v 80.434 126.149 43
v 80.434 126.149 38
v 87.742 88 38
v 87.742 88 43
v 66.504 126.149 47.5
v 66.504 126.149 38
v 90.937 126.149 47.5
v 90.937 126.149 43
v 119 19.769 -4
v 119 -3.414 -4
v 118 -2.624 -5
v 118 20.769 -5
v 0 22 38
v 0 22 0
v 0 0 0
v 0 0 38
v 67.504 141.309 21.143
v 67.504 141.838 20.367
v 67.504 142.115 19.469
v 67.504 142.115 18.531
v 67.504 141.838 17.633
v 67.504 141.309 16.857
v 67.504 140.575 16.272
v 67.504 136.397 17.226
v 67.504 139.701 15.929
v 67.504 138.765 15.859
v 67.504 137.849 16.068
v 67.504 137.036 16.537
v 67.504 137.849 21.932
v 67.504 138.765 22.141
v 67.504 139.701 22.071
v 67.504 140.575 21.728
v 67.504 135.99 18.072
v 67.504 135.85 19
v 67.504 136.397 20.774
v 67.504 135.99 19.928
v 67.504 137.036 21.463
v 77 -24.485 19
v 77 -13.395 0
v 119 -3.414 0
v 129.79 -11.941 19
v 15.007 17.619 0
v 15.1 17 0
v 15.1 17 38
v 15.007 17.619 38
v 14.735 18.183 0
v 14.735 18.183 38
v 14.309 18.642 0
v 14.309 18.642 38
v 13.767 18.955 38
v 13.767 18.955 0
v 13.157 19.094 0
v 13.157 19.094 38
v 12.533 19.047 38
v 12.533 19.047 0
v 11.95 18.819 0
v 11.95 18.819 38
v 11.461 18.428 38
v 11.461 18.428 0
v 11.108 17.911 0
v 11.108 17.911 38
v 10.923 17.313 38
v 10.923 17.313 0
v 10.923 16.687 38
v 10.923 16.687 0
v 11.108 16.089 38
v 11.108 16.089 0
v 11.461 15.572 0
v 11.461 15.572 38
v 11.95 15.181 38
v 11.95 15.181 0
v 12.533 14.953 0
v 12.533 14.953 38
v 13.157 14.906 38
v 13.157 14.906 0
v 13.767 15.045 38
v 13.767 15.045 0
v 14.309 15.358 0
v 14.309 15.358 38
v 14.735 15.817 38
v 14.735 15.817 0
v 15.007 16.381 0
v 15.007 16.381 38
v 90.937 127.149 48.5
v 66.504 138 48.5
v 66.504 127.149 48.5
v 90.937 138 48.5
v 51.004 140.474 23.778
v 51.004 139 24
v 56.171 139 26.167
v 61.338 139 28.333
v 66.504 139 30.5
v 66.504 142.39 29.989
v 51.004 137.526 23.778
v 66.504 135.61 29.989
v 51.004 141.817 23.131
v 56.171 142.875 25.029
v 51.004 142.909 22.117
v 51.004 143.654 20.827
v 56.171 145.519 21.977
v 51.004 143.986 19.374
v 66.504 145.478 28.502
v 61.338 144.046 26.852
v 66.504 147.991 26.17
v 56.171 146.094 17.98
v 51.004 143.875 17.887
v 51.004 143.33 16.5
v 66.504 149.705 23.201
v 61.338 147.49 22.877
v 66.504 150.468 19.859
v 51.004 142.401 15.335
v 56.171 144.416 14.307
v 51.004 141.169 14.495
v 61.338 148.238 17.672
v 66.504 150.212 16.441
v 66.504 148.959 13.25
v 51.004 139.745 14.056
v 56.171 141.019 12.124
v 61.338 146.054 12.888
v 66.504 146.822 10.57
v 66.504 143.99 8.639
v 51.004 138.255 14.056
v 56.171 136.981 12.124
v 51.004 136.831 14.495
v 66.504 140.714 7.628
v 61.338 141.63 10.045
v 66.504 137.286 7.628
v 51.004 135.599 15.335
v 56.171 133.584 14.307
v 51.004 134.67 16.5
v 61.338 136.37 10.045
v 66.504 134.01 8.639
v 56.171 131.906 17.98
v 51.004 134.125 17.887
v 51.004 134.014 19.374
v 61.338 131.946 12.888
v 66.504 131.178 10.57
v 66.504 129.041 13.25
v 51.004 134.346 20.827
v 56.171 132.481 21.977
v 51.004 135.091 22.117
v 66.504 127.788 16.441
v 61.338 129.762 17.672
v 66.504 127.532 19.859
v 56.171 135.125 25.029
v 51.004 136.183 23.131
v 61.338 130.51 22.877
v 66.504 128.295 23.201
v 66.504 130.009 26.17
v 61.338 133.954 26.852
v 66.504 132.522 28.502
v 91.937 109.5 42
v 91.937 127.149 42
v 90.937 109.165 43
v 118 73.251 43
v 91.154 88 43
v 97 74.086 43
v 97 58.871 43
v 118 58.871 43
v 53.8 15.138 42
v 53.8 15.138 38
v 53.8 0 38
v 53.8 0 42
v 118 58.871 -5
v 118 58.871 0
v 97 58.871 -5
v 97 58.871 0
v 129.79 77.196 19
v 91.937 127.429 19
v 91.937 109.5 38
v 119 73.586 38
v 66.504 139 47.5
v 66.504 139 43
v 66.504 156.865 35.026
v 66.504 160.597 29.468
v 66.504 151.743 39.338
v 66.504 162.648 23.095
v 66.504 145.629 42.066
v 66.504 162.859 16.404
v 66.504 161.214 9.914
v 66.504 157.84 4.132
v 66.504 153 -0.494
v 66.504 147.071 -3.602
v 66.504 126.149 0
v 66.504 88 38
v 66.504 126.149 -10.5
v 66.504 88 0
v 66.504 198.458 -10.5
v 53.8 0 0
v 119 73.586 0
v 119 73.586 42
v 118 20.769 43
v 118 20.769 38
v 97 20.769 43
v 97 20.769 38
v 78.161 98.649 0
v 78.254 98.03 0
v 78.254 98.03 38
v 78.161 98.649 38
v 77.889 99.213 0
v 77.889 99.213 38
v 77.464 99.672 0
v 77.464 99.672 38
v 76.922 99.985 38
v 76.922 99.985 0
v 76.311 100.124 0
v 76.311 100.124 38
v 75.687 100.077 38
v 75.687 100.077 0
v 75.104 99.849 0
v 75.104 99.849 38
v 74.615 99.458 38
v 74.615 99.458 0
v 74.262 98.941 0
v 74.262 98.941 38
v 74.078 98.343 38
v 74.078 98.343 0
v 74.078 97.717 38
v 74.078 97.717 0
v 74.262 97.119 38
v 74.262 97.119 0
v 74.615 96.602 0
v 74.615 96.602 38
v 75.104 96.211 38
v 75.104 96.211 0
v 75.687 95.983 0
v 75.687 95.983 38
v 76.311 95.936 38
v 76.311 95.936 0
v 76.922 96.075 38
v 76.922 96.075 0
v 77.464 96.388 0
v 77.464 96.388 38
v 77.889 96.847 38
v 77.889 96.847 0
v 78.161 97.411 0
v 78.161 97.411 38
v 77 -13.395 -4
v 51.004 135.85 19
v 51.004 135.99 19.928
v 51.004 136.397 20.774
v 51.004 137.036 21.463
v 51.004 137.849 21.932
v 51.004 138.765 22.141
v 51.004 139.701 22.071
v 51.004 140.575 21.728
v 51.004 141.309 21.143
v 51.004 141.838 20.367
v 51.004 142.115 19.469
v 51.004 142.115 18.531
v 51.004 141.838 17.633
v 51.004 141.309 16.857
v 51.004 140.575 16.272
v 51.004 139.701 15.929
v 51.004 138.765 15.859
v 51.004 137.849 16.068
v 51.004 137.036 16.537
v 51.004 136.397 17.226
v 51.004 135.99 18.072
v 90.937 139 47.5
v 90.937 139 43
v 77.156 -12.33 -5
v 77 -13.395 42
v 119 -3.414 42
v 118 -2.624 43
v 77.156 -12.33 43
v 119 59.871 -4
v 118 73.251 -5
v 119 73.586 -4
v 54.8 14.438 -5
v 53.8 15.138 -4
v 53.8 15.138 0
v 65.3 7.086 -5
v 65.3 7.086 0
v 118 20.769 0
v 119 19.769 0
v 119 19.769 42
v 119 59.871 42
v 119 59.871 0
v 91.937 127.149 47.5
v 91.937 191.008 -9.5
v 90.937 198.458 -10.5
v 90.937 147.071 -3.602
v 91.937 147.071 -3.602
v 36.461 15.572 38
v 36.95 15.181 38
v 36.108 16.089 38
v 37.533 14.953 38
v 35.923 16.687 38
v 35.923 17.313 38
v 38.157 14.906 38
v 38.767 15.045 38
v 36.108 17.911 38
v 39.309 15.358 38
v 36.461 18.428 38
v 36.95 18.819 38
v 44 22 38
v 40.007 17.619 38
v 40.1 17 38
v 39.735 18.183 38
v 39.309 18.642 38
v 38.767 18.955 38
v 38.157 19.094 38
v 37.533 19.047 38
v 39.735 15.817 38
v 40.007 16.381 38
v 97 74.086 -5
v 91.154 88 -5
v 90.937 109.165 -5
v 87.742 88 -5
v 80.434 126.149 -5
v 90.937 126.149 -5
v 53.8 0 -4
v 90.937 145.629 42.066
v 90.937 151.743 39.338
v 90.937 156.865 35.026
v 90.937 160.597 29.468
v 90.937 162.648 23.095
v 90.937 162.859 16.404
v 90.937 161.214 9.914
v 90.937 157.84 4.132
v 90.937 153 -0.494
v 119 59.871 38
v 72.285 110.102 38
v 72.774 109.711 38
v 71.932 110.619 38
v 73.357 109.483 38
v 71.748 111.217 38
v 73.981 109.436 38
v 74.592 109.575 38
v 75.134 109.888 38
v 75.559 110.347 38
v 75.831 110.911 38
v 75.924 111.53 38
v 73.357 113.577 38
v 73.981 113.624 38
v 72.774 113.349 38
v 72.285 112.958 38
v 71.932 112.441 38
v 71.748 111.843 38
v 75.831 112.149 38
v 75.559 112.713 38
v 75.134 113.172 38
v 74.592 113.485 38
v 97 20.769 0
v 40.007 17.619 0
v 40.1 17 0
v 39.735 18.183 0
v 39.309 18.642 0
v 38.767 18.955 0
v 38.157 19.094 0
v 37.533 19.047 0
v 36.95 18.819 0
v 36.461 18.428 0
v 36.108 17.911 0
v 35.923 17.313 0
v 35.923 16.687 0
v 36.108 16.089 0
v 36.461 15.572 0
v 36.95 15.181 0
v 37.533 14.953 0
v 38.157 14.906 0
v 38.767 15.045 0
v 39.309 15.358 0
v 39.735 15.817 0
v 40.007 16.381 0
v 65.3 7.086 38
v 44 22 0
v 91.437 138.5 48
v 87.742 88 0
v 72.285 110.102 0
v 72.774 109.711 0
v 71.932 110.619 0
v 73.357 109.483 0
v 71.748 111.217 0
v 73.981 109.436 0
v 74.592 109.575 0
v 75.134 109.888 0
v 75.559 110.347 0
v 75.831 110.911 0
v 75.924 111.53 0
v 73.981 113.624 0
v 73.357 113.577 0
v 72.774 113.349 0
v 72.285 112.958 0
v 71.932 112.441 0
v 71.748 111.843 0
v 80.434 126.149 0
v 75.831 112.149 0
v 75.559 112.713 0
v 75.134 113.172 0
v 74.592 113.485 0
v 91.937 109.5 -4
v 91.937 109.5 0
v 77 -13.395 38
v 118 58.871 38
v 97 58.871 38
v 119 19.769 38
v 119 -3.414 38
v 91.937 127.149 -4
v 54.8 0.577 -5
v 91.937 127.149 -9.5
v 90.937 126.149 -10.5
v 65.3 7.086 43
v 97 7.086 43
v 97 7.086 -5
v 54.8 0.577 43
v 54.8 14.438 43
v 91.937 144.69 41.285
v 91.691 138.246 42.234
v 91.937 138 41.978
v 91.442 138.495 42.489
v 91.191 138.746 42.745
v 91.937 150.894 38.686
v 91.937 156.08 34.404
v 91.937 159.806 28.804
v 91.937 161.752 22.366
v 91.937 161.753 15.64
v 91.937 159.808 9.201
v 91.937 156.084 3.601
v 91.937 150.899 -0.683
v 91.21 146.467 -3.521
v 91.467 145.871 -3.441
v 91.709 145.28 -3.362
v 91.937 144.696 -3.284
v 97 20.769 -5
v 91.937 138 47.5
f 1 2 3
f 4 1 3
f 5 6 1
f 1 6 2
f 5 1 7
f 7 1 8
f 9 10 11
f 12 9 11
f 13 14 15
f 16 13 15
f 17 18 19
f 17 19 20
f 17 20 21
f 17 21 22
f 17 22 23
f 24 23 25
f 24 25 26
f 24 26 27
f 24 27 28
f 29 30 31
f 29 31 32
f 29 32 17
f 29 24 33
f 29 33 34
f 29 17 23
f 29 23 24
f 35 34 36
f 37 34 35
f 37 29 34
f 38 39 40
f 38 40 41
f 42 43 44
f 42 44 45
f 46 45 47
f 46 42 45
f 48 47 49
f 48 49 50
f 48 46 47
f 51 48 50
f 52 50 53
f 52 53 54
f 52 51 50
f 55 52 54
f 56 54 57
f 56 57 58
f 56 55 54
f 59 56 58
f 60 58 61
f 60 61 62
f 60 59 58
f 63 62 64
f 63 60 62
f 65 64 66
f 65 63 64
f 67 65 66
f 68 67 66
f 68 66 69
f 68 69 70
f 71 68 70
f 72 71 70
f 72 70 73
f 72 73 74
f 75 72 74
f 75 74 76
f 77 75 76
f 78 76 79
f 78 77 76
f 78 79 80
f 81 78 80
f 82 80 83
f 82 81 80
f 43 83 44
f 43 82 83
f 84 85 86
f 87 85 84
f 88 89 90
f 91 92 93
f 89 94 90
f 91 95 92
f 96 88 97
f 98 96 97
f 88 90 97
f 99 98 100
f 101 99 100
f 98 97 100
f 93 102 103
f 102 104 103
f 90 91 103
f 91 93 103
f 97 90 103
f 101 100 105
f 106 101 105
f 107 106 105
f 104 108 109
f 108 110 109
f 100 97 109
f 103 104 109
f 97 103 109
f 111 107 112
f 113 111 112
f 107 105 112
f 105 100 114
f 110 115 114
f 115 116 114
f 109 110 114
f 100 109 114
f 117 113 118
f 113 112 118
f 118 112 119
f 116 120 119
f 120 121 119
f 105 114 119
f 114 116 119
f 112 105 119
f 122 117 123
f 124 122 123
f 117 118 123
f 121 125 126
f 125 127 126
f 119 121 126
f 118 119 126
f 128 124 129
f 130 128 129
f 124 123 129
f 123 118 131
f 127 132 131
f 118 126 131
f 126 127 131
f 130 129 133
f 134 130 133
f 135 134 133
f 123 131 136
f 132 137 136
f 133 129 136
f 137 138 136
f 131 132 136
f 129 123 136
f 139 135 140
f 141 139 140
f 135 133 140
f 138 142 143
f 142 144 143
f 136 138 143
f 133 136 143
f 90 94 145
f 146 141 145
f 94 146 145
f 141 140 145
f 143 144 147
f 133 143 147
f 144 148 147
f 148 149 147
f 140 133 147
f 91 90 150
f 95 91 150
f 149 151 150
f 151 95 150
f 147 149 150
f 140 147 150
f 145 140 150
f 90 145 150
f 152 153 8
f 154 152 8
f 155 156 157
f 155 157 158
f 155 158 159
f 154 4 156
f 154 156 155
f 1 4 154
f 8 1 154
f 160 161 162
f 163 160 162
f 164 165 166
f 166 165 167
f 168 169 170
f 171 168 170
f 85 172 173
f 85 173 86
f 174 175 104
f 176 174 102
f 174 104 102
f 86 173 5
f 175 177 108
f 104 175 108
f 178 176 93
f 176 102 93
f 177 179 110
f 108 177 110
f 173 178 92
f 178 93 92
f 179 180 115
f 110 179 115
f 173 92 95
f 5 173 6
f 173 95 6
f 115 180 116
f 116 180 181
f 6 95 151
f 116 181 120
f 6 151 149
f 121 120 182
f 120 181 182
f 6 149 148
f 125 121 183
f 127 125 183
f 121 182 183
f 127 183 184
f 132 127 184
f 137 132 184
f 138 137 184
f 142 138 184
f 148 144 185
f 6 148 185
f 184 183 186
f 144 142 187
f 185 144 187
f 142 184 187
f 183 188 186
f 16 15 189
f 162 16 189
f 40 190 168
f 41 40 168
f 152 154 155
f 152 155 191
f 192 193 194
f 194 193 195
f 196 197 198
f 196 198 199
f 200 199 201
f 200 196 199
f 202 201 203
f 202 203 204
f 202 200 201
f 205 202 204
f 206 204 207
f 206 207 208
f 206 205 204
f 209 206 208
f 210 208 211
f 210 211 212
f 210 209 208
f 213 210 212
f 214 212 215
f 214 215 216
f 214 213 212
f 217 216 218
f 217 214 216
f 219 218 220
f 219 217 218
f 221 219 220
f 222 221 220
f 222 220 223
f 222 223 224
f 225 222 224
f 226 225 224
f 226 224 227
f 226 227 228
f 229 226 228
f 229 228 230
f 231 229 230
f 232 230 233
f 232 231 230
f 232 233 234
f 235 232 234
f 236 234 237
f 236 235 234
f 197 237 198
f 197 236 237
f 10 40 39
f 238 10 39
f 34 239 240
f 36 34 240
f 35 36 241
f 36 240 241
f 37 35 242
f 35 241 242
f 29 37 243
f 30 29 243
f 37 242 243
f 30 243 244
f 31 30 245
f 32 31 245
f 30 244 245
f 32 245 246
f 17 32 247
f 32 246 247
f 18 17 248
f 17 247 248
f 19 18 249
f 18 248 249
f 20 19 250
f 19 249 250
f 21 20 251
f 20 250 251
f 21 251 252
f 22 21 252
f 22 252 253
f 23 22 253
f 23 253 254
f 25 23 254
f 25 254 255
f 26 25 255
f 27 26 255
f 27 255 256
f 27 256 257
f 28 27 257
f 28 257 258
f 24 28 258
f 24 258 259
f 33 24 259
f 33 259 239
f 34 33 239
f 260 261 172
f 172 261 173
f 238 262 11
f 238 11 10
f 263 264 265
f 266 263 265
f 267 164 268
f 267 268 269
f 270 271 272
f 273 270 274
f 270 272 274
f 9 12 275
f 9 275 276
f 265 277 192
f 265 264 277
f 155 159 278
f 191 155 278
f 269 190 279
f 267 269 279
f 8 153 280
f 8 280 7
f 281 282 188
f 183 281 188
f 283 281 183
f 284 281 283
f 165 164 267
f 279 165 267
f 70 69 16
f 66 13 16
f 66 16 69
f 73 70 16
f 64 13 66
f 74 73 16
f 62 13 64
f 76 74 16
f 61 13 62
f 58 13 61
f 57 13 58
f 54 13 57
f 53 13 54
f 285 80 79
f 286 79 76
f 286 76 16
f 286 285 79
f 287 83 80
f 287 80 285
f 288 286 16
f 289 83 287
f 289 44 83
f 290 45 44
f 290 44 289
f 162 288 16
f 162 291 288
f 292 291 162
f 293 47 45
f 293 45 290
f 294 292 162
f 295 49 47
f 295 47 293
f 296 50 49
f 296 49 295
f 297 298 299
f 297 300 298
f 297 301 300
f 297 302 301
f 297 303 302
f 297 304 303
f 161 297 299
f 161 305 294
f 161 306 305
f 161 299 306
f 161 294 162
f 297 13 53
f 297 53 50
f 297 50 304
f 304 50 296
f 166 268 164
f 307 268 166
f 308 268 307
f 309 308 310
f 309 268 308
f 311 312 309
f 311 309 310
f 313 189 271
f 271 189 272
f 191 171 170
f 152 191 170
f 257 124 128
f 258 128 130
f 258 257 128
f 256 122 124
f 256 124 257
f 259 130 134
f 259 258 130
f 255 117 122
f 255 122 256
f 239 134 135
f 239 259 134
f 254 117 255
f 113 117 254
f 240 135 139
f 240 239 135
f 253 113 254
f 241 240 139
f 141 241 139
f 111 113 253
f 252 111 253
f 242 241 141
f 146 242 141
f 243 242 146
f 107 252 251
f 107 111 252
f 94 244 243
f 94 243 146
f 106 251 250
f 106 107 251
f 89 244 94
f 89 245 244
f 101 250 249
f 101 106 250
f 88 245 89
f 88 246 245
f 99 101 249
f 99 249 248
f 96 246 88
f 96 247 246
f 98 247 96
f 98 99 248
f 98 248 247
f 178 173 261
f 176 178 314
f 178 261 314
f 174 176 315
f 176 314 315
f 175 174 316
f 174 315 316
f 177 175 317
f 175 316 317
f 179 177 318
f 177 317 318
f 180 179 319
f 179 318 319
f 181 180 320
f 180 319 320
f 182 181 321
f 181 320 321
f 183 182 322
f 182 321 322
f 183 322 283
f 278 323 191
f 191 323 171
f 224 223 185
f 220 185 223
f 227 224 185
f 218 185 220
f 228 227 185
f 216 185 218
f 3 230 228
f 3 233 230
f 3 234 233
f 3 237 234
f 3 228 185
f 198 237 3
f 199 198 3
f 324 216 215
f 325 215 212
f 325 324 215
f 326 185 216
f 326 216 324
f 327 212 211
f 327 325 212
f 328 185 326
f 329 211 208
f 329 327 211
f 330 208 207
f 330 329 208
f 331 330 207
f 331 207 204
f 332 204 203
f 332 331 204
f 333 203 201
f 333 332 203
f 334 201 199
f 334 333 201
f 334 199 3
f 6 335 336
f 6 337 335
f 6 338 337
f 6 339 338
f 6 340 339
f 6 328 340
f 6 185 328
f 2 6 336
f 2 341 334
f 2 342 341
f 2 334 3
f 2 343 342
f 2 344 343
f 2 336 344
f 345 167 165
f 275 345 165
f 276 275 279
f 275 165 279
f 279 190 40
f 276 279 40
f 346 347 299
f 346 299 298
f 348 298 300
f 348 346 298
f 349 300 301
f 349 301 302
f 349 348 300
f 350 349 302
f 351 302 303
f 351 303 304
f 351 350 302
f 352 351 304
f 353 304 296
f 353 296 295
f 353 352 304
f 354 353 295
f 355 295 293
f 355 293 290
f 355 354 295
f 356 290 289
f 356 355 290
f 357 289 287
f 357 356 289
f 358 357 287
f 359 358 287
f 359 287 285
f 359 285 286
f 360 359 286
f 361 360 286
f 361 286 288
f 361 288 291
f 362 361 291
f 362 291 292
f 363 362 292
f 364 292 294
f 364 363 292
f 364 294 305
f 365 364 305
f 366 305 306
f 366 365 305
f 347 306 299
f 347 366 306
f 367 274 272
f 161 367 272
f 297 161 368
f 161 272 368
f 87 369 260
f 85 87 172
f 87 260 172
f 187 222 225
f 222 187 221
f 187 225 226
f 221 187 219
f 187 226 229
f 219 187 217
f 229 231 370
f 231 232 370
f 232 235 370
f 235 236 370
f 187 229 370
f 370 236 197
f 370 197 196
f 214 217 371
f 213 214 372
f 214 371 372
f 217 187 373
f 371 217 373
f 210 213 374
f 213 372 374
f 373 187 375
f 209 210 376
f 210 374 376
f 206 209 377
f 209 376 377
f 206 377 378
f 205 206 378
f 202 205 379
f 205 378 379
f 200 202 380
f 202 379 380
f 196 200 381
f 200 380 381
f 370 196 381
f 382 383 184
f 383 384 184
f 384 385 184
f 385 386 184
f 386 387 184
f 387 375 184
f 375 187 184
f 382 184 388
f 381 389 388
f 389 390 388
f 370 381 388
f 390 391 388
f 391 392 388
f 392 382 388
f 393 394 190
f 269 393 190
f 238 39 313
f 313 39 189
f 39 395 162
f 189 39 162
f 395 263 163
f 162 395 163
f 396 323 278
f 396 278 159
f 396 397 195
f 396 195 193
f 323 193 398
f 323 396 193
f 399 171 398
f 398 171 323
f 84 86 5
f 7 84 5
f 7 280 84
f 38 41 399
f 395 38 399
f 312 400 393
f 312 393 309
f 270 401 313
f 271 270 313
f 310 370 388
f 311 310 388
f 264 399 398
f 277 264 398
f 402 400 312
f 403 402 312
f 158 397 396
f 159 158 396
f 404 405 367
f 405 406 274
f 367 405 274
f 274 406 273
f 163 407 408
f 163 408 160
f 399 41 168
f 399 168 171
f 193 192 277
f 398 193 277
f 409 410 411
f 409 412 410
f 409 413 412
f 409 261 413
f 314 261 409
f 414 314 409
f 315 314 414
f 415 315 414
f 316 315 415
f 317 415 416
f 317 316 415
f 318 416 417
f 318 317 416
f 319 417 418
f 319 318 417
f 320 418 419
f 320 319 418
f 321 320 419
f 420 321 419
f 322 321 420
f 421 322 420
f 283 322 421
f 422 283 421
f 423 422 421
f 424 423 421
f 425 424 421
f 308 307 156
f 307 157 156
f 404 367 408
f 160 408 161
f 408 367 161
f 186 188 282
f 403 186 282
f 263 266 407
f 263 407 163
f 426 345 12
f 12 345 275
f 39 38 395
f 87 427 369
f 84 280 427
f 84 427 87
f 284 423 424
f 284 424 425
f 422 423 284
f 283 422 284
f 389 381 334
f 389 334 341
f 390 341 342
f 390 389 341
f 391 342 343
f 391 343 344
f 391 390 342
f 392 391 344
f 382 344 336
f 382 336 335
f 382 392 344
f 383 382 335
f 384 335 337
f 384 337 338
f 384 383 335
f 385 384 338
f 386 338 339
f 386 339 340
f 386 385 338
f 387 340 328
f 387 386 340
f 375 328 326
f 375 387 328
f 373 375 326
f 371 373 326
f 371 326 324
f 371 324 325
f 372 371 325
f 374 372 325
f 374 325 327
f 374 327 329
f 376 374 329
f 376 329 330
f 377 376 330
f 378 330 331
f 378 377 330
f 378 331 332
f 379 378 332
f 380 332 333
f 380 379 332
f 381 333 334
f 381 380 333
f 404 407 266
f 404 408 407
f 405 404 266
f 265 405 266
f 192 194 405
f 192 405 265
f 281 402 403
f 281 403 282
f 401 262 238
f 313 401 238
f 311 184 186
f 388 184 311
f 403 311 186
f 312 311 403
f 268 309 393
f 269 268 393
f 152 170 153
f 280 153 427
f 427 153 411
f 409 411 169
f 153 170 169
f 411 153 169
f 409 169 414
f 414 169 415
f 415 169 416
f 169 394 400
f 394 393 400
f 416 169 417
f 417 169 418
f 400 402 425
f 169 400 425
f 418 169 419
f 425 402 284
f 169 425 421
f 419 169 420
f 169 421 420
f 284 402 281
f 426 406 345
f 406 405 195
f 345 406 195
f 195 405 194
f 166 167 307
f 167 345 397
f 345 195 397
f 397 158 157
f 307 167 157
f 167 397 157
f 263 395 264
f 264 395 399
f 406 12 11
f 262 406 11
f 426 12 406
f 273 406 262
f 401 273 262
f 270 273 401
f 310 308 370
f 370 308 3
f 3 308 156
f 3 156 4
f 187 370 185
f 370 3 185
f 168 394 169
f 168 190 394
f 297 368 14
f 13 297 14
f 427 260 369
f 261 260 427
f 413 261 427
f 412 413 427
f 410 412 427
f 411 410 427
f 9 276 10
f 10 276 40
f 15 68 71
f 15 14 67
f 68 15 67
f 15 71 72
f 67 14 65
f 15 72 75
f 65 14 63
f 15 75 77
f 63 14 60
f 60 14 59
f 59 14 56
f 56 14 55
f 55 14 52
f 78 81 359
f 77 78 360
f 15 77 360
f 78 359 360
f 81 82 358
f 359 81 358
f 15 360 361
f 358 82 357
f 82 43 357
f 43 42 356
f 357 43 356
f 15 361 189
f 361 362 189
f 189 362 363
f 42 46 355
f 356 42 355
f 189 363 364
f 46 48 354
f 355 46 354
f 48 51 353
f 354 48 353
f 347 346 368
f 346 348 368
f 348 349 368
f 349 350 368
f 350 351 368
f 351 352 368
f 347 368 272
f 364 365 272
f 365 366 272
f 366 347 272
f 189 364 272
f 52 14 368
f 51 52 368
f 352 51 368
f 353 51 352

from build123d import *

# Parameters (mm, degrees)
SKETCH_1_R          = 2.1
EXTRUDE_1_DEPTH     = 38
CUT_EXTRUDE_1_DEPTH = 187.709206858
SKETCH_3_R          = 3.15
CUT_EXTRUDE_3_DEPTH = 1
EXTRUDE_2_DEPTH     = 5
EXTRUDE_3_DEPTH     = 5
EXTRUDE_2_2_DEPTH   = 25.432180104
EXTRUDE_7_DEPTH     = 25.432180104
SKETCH_18_W         = 25.432180104
SKETCH_18_H         = 5.5
EXTRUDE_8_DEPTH     = 2.30961622
EXTRUDE_10_DEPTH    = 5.5
SKETCH_21_R         = 5
SKETCH_20_R         = 11.5
SKETCH_23_R         = 3.15
CUT_EXTRUDE_4_DEPTH = 15.5
CHAMFER_1_SIZE      = 1


with BuildPart() as part:
    # 草图1 → 凸台-拉伸1 (new body)
    with BuildSketch(Plane.XY):
        Polygon((0, 0), (53.8, 0), (77, -13.394526245), (119, -3.414420564), (119, 73.585579436), (91.936542927, 109.5), (91.936542927, 158), (66.504362823, 158), (66.504362823, 88), (91.154362823, 88), (97, 74.085579436), (97, 7.085579436), (65.3, 7.085579436), (44, 22), (0, 22), align=None)
        with Locations((73.824362823, 111.53)):
            Circle(SKETCH_1_R, mode=Mode.SUBTRACT)
        with Locations((76.154362823, 98.03)):
            Circle(SKETCH_1_R, mode=Mode.SUBTRACT)
        with Locations((13, 17)):
            Circle(SKETCH_1_R, mode=Mode.SUBTRACT)
        with Locations((38, 17)):
            Circle(SKETCH_1_R, mode=Mode.SUBTRACT)
    extrude(amount=EXTRUDE_1_DEPTH)

    # 草图2 → 切除-拉伸1 (cut, through all)
    with BuildSketch(Plane(origin=(91.936542927, 0, 0), x_dir=(0, 0, -1), z_dir=(1, 0, 0))):
        with BuildLine():
            Line((-38, 158), (-38, 139))
            ThreePointArc((-38, 139), (-32.435028843, 152.435028843), (-19, 158))
            Line((-19, 158), (-38, 158))
        make_face()
        with BuildLine():
            Line((0, 158), (-19, 158))
            ThreePointArc((-19, 158), (-5.564971157, 152.435028843), (0, 139))
            Line((0, 139), (0, 158))
        make_face()
    extrude(amount=-CUT_EXTRUDE_1_DEPTH, mode=Mode.SUBTRACT)

    # 草图3 → 切除-拉伸3 (cut)
    with BuildSketch(Plane.ZY.offset(-66.504362823)):
        with Locations(Location((19, 139, 0), (0, 0, 270))):
            Circle(SKETCH_3_R)
    extrude(amount=-CUT_EXTRUDE_3_DEPTH, mode=Mode.SUBTRACT)

    # 扫描3: sweep along a path in 草图13
    with BuildLine(Plane.XY.offset(19)) as sweep_3_path:
        Line((91.936542927, 127.429097123), (129.79, 77.195862934))
        Line((129.79, 77.195862934), (129.79, -11.941020396))
        Line((129.79, -11.941020396), (77, -24.485062752))
    # 草图4 → 扫描3 (sweep)
    with BuildSketch(Plane.ZY.offset(-77)):
        Polygon((38, -13.394526245), (0, -13.394526245), (19, -24.485062752), align=None)
    sweep(path=sweep_3_path.line, transition=Transition.RIGHT)

    # 草图14 → Extrude 2 (add)
    with BuildSketch(Plane.XY.offset(38)):
        Polygon((66.504362823, 139), (66.504362823, 126.148557267), (80.434084519, 126.148557267), (87.742437222, 88), (91.154362823, 88), (97, 74.085579436), (97, 58.870893274), (118.999906629, 58.870893274), (118.999906629, 73.585548195), (91.936542927, 109.499844851), (91.936542927, 139), align=None)
        Polygon((118.999906629, 20.768869661), (97, 20.768869661), (97, 7.085579436), (65.3, 7.085579436), (53.8, 15.137966126), (53.8, 0), (77, -13.394526245), (118.999906629, -3.414439978), align=None)
    extrude(amount=EXTRUDE_2_DEPTH)

    # 草图15 → 凸台-拉伸3 (add)
    with BuildSketch(Plane(origin=(0, 0, 0), x_dir=(-1, 0, 0), z_dir=(0, 0, -1))):
        Polygon((-118.999906629, 73.585548195), (-118.999906629, 58.870893274), (-97, 58.870893274), (-97, 74.085579436), (-91.154362823, 88), (-87.742437222, 88), (-80.434084519, 126.148557267), (-66.504362823, 126.148557267), (-66.504362823, 139), (-91.936542927, 139), (-91.936542927, 109.499844851), align=None)
        Polygon((-77, -13.394526245), (-53.8, 0), (-53.8, 15.137966126), (-65.3, 7.085579436), (-97, 7.085579436), (-97, 20.768869661), (-118.999906629, 20.768869661), (-118.999906629, -3.414442751), align=None)
    extrude(amount=EXTRUDE_3_DEPTH)

    # 草图16 → Extrude 2 2 (add)
    with BuildSketch(Plane(origin=(91.936542927, 0, 0), x_dir=(0, 0, -1), z_dir=(1, 0, 0))):
        with BuildLine():
            ThreePointArc((-43, 139), (-19, 163), (5, 139))
            Line((5, 139), (-5, 139))
            ThreePointArc((-5, 139), (-19, 153), (-33, 139))
            Line((-33, 139), (-43, 139))
        make_face()
    extrude(amount=-EXTRUDE_2_2_DEPTH)

    # 草图17 → 凸台-拉伸7 (add)
    with BuildSketch(Plane(origin=(91.936542927, 0, 0), x_dir=(0, 0, -1), z_dir=(1, 0, 0))):
        with BuildLine():
            Line((5, 139), (5, 128.458173487))
            Line((5, 128.458173487), (10.5, 128.458173487))
            Line((10.5, 128.458173487), (10.5, 198.458173487))
            Line((10.5, 198.458173487), (3.602302269, 147.070683498))
            ThreePointArc((3.602302269, 147.070683498), (4.647994148, 143.095408742), (5, 139))
        make_face()
    extrude(amount=-EXTRUDE_7_DEPTH)

    # 草图18 → 凸台-拉伸8 (add)
    with BuildSketch(Plane.XZ.offset(-128.458173487)):
        with Locations((79.220452875, -7.75)):
            Rectangle(SKETCH_18_W, SKETCH_18_H)
    extrude(amount=EXTRUDE_8_DEPTH)

    # 草图19 → 凸台-拉伸10 (add)
    with BuildSketch(Plane.XY.offset(43)):
        Polygon((66.504362823, 126.148557267), (80.434084519, 126.148557267), (91.936542927, 126.148557267), (91.936542927, 139), (66.504362823, 139), align=None)
    extrude(amount=EXTRUDE_10_DEPTH)

    # 草图21 → 放样1 section 0
    with BuildSketch(Plane.ZY.offset(-51.004362823)):
        with Locations((19, 139)):
            Circle(SKETCH_21_R)
    # 草图20 → 放样1 section 1
    with BuildSketch(Plane.ZY.offset(-66.504362823)):
        with Locations((19, 139)):
            Circle(SKETCH_20_R)
    loft()

    # 草图23 → 切除-拉伸4 (cut)
    with BuildSketch(Plane.ZY.offset(-51.004362823)):
        with Locations(Location((19, 139, 0), (0, 0, 270))):
            Circle(SKETCH_23_R)
    extrude(amount=-CUT_EXTRUDE_4_DEPTH, mode=Mode.SUBTRACT)

    # 倒角1
    chamfer_1_edges = [part.edges().sort_by_distance(p)[0] for p in [
        (79.220452875, 139, 48.5),
    ]]
    chamfer(chamfer_1_edges, length=CHAMFER_1_SIZE)

    # 倒角3
    # the kernel refuses this chamfer: 1 mm, written as the material it takes off along each edge
    with BuildSketch(Plane(origin=(91.26987626, 126.815223933, 47.833333333), x_dir=(-0.7071067811865475, 0, 0.7071067811865475), z_dir=(0.5773502691896258, -0.5773502691896258, 0.5773502691896258))) as chamfer_3_piece_1:
        Polygon((-0.707106781, -0.40824829), (0.707106781, -0.40824829), (0, 0.816496581), align=None)
    extrude(amount=1.270170592, mode=Mode.SUBTRACT)
    with BuildSketch(Plane(origin=(53.8, 17.709649114, 43), x_dir=(0.9996219169112968, 0, 0.027495876610589005), z_dir=(0, -1, 0)), Plane(origin=(53.8, -2.571682988, -5), x_dir=(0.9996219169112968, 0, -0.027495876610586414), z_dir=(0, 1, 0))) as chamfer_3_piece_2:
        with BuildLine():
            Line((1.028673195, 0), (-0.056547155, -1.027117794))
            Line((-0.056547155, -1.027117794), (-0.076539593, -1.026567876))
            ThreePointArc((-0.076539593, -1.026567876), (-0.034129227, -0.51339783), (-0.019992438, 0.000549918))
            Line((-0.019992438, 0.000549918), (0.000549918, 0.019992438))
            ThreePointArc((0.000549918, 0.019992438), (0.514497665, 0.00585565), (1.029223113, 0.019992438))
            Line((1.029223113, 0.019992438), (1.028673195, 0))
        make_face()
    extrude(amount=20.281332101, mode=Mode.SUBTRACT)
    with BuildSketch(Plane(origin=(118.999906629, 20.768869661, 38), x_dir=(-0.9996219169112968, 0.02749587661058574, 0), z_dir=(0, 0, 1)), Plane(origin=(118.999906629, 58.870893274, 38), x_dir=(0.027495876610582105, 0.999621916911297, 0), z_dir=(0, 0, 1)), Plane(origin=(118.999906629, 58.870893274, 0), x_dir=(-0.9996219169112968, -0.027495876610589196, 0), z_dir=(0, 0, -1))) as chamfer_3_piece_3:
        with BuildLine():
            Line((1.028673195, 0), (-0.056547155, 1.027117794))
            Line((-0.056547155, 1.027117794), (-0.076539593, 1.026567876))
            ThreePointArc((-0.076539593, 1.026567876), (-0.034129227, 0.51339783), (-0.019992438, -0.000549918))
            Line((-0.019992438, -0.000549918), (0.000549918, -0.019992438))
            ThreePointArc((0.000549918, -0.019992438), (0.514497665, -0.00585565), (1.029223113, -0.019992438))
            Line((1.029223113, -0.019992438), (1.028673195, 0))
        make_face()
    extrude(amount=7.571682988, mode=Mode.SUBTRACT)
    with BuildSketch(Plane(origin=(51.572857202, 1.285841494, 43), x_dir=(0.4998109584556499, 0.8656979742248793, 0.027495876610589116), z_dir=(0.8660254037844378, -0.5000000000000017, 0)), Plane(origin=(79.227142798, -14.680367739, -5), x_dir=(0.49981095845565, 0.8656979742248795, -0.027495876610586535), z_dir=(-0.8660254037844378, 0.5000000000000017, 0))) as chamfer_3_piece_4:
        with BuildLine():
            Line((1.028673195, 0), (-0.056547155, -1.027117794))
            Line((-0.056547155, -1.027117794), (-0.076539593, -1.026567876))
            ThreePointArc((-0.076539593, -1.026567876), (-0.034129227, -0.51339783), (-0.019992438, 0.000549918))
            Line((-0.019992438, 0.000549918), (0.000549918, 0.019992438))
            ThreePointArc((0.000549918, 0.019992438), (0.514497665, 0.00585565), (1.029223113, 0.019992438))
            Line((1.029223113, 0.019992438), (1.028673195, 0))
        make_face()
    extrude(amount=31.932418466, mode=Mode.SUBTRACT)
    with BuildSketch(Plane(origin=(74.497984058, -13.989059351, 43), x_dir=(0.006356618994580412, -0.0267510116732474, -0.9996219169112968), z_dir=(0.9729099403562855, 0.23118444574825722, 0))) as chamfer_3_piece_5:
        with BuildLine():
            Line((1.028673195, 0), (-0.056547155, 1.027117794))
            Line((-0.056547155, 1.027117794), (-0.076539593, 1.026567876))
            ThreePointArc((-0.076539593, 1.026567876), (-0.034129227, 0.51339783), (-0.019992438, -0.000549918))
            Line((-0.019992438, -0.000549918), (0.000549918, -0.019992438))
            ThreePointArc((0.000549918, -0.019992438), (0.514497665, -0.00585565), (1.029223113, -0.019992438))
            Line((1.029223113, -0.019992438), (1.028673195, 0))
        make_face()
    extrude(amount=48.312733341, mode=Mode.SUBTRACT)
    with BuildSketch(Plane(origin=(118.999906629, -5.986122965, 43), x_dir=(0.027495876610582105, 0, -0.999621916911297), z_dir=(0, 1, 0))) as chamfer_3_piece_6:
        with BuildLine():
            Line((1.028673195, 0), (-0.056547155, 1.027117794))
            Line((-0.056547155, 1.027117794), (-0.076539593, 1.026567876))
            ThreePointArc((-0.076539593, 1.026567876), (-0.034129227, 0.51339783), (-0.019992438, -0.000549918))
            Line((-0.019992438, -0.000549918), (0.000549918, -0.019992438))
            ThreePointArc((0.000549918, -0.019992438), (0.514497665, -0.00585565), (1.029223113, -0.019992438))
            Line((1.029223113, -0.019992438), (1.028673195, 0))
        make_face()
    extrude(amount=29.326675615, mode=Mode.SUBTRACT)
    with BuildSketch(Plane(origin=(118.999906629, 56.299210286, 43), x_dir=(-0.9996219169112968, 0, 0.027495876610589196), z_dir=(0, 1, 0)), Plane(origin=(118.999906629, 76.157231183, -5), x_dir=(-0.9996219169112968, 0, -0.027495876610586605), z_dir=(0, -1, 0))) as chamfer_3_piece_7:
        with BuildLine():
            Line((1.028673195, 0), (-0.056547155, -1.027117794))
            Line((-0.056547155, -1.027117794), (-0.076539593, -1.026567876))
            ThreePointArc((-0.076539593, -1.026567876), (-0.034129227, -0.51339783), (-0.019992438, 0.000549918))
            Line((-0.019992438, 0.000549918), (0.000549918, 0.019992438))
            ThreePointArc((0.000549918, 0.019992438), (0.514497665, 0.00585565), (1.029223113, 0.019992438))
            Line((1.029223113, 0.019992438), (1.028673195, 0))
        make_face()
    extrude(amount=19.858020896, mode=Mode.SUBTRACT)
    with BuildSketch(Plane(origin=(120.547584086, 71.53171084, 43), x_dir=(-0.7983335594669047, -0.6015874870692686, 0.027495876610589096), z_dir=(-0.60181502315205, 0.7986355100472916, 0))) as chamfer_3_piece_8_section:
        with BuildLine():
            Line((1.028673195, 0), (-0.056547155, -1.027117794))
            Line((-0.056547155, -1.027117794), (-0.076539593, -1.026567876))
            ThreePointArc((-0.076539593, -1.026567876), (-0.034129227, -0.51339783), (-0.019992438, 0.000549918))
            Line((-0.019992438, 0.000549918), (0.000549918, 0.019992438))
            ThreePointArc((0.000549918, 0.019992438), (0.514497665, 0.00585565), (1.029223113, 0.019992438))
            Line((1.029223113, 0.019992438), (1.028673195, 0))
        make_face()
    chamfer_3_piece_8 = extrude(amount=50.112937457, mode=Mode.PRIVATE)
    chamfer_3_piece_8 = split(chamfer_3_piece_8, bisect_by=Plane(origin=(91.936542927, 90.144566019, 42.669249939), z_dir=(1, 0, 0)), keep=Keep.TOP, mode=Mode.PRIVATE)
    add(chamfer_3_piece_8, mode=Mode.SUBTRACT)
    with BuildSketch(Plane(origin=(91.936542927, 106.928161863, 43), x_dir=(0.027495876610582105, 0, -0.999621916911297), z_dir=(0, 1, 0))) as chamfer_3_piece_9_section:
        with BuildLine():
            Line((1.028673195, 0), (-0.056547155, 1.027117794))
            Line((-0.056547155, 1.027117794), (-0.076539593, 1.026567876))
            ThreePointArc((-0.076539593, 1.026567876), (-0.034129227, 0.51339783), (-0.019992438, -0.000549918))
            Line((-0.019992438, -0.000549918), (0.000549918, -0.019992438))
            ThreePointArc((0.000549918, -0.019992438), (0.514497665, -0.00585565), (1.029223113, -0.019992438))
            Line((1.029223113, -0.019992438), (1.028673195, 0))
        make_face()
    chamfer_3_piece_9 = extrude(amount=19.220395404, mode=Mode.PRIVATE)
    chamfer_3_piece_9 = split(chamfer_3_piece_9, bisect_by=Plane(origin=(87.71452173, 115.102656217, 42.667427315), z_dir=(0.7986355100472916, 0.60181502315205, 0)), keep=Keep.TOP, mode=Mode.PRIVATE)
    add(chamfer_3_piece_9, mode=Mode.SUBTRACT)
    with BuildSketch(Plane(origin=(90.38886547, 111.553682205, -5), x_dir=(-0.7983335594669051, -0.6015874870692681, -0.027495876610586504), z_dir=(0.6018150231520495, -0.7986355100472919, 0))) as chamfer_3_piece_10_section:
        with BuildLine():
            Line((1.028673195, 0), (-0.056547155, -1.027117794))
            Line((-0.056547155, -1.027117794), (-0.076539593, -1.026567876))
            ThreePointArc((-0.076539593, -1.026567876), (-0.034129227, -0.51339783), (-0.019992438, 0.000549918))
            Line((-0.019992438, 0.000549918), (0.000549918, 0.019992438))
            ThreePointArc((0.000549918, 0.019992438), (0.514497665, 0.00585565), (1.029223113, 0.019992438))
            Line((1.029223113, 0.019992438), (1.028673195, 0))
        make_face()
    chamfer_3_piece_10 = extrude(amount=50.112937457, mode=Mode.PRIVATE)
    chamfer_3_piece_10 = split(chamfer_3_piece_10, bisect_by=Plane(origin=(91.936542927, 90.144566019, -4.669249939), z_dir=(1, 0, 0)), keep=Keep.TOP, mode=Mode.PRIVATE)
    add(chamfer_3_piece_10, mode=Mode.SUBTRACT)
    with BuildSketch(Plane(origin=(118.999906629, 20.768869661, 0), x_dir=(-0.9996219169112968, 0.02749587661058574, 0), z_dir=(0, 0, -1))) as chamfer_3_piece_11:
        with BuildLine():
            Line((1.028673195, 0), (-0.056547155, -1.027117794))
            Line((-0.056547155, -1.027117794), (-0.076539593, -1.026567876))
            ThreePointArc((-0.076539593, -1.026567876), (-0.034129227, -0.51339783), (-0.019992438, 0.000549918))
            Line((-0.019992438, 0.000549918), (0.000549918, 0.019992438))
            ThreePointArc((0.000549918, 0.019992438), (0.514497665, 0.00585565), (1.029223113, 0.019992438))
            Line((1.029223113, 0.019992438), (1.028673195, 0))
        make_face()
    extrude(amount=7.571682988, mode=Mode.SUBTRACT)
    with BuildSketch(Plane(origin=(118.999906629, 23.340552649, -5), x_dir=(0.02749587661058217, 0, 0.9996219169112968), z_dir=(0, -1, 0))) as chamfer_3_piece_12:
        with BuildLine():
            Line((1.028673195, 0), (-0.056547155, 1.027117794))
            Line((-0.056547155, 1.027117794), (-0.076539593, 1.026567876))
            ThreePointArc((-0.076539593, 1.026567876), (-0.034129227, 0.51339783), (-0.019992438, -0.000549918))
            Line((-0.019992438, -0.000549918), (0.000549918, -0.019992438))
            ThreePointArc((0.000549918, -0.019992438), (0.514497665, -0.00585565), (1.029223113, -0.019992438))
            Line((1.029223113, -0.019992438), (1.028673195, 0))
        make_face()
    extrude(amount=29.326678388, mode=Mode.SUBTRACT)
    with BuildSketch(Plane(origin=(121.501922608, -2.819909801, -5), x_dir=(-0.2310969780314448, 0.9725421140054292, -0.027495876610586514), z_dir=(-0.9729099548061726, -0.231184384937762, 0))) as chamfer_3_piece_13:
        with BuildLine():
            Line((1.028673195, 0), (-0.056547155, -1.027117794))
            Line((-0.056547155, -1.027117794), (-0.076539593, -1.026567876))
            ThreePointArc((-0.076539593, -1.026567876), (-0.034129227, -0.51339783), (-0.019992438, 0.000549918))
            Line((-0.019992438, 0.000549918), (0.000549918, 0.019992438))
            ThreePointArc((0.000549918, 0.019992438), (0.514497665, 0.00585565), (1.029223113, 0.019992438))
            Line((1.029223113, 0.019992438), (1.028673195, 0))
        make_face()
    extrude(amount=48.3127327, mode=Mode.SUBTRACT)
    with BuildSketch(Plane(origin=(91.936542927, 139, 19), x_dir=(0, 0, 1), z_dir=(0, -1, 0))) as chamfer_3_piece_14_section:
        with BuildLine():
            Line((22.971715729, -0.028284271), (24.028284271, 1.028284271))
            Line((24.028284271, 1.028284271), (24.048284271, 1.028284271))
            ThreePointArc((24.048284271, 1.028284271), (24.02, 0.514142136), (24.02, 0))
            Line((24.02, 0), (24, -0.02))
            ThreePointArc((24, -0.02), (23.485857864, -0.02), (22.971715729, -0.048284271))
            Line((22.971715729, -0.048284271), (22.971715729, -0.028284271))
        make_face()
    chamfer_3_piece_14 = revolve(axis=Axis((91.936542927, 139, 19), (-1, 0, 0)), revolution_arc=166.496974045, mode=Mode.PRIVATE)
    chamfer_3_piece_14 = split(chamfer_3_piece_14, bisect_by=Plane(origin=(91.460066415, 158.711193826, -5.164797766), z_dir=(0, 0.13303598850024104, 0.9911112075664182)), keep=Keep.TOP, mode=Mode.PRIVATE)
    add(chamfer_3_piece_14, mode=Mode.SUBTRACT)
    with BuildSketch(Plane(origin=(91.936542927, 123.576874279, -10.5), x_dir=(0.0274958766105822, 0, 0.999621916911297), z_dir=(0, 1, 0))) as chamfer_3_piece_15:
        with BuildLine():
            Line((1.028673195, 0), (-0.056547155, -1.027117794))
            Line((-0.056547155, -1.027117794), (-0.076539593, -1.026567876))
            ThreePointArc((-0.076539593, -1.026567876), (-0.034129227, -0.51339783), (-0.019992438, 0.000549918))
            Line((-0.019992438, 0.000549918), (0.000549918, 0.019992438))
            ThreePointArc((0.000549918, 0.019992438), (0.514497665, 0.00585565), (1.029223113, 0.019992438))
            Line((1.029223113, 0.019992438), (1.028673195, 0))
        make_face()
    extrude(amount=77.452982196, mode=Mode.SUBTRACT)
    with BuildSketch(Plane(origin=(91.936542927, 126.148557267, -5), x_dir=(0.02749587661058217, 0, 0.9996219169112968), z_dir=(0, -1, 0))) as chamfer_3_piece_16_section:
        with BuildLine():
            Line((1.028673195, 0), (-0.056547155, 1.027117794))
            Line((-0.056547155, 1.027117794), (-0.076539593, 1.026567876))
            ThreePointArc((-0.076539593, 1.026567876), (-0.034129227, 0.51339783), (-0.019992438, -0.000549918))
            Line((-0.019992438, -0.000549918), (0.000549918, -0.019992438))
            ThreePointArc((0.000549918, -0.019992438), (0.514497665, -0.00585565), (1.029223113, -0.019992438))
            Line((1.029223113, -0.019992438), (1.028673195, 0))
        make_face()
    chamfer_3_piece_16 = extrude(amount=19.220395404, mode=Mode.PRIVATE)
    chamfer_3_piece_16 = split(chamfer_3_piece_16, bisect_by=Plane(origin=(87.71452173, 115.102656217, -4.667427315), z_dir=(0.7986355100472919, 0.6018150231520495, 0)), keep=Keep.TOP, mode=Mode.PRIVATE)
    add(chamfer_3_piece_16, mode=Mode.SUBTRACT)
    with BuildSketch(Plane(origin=(91.936542927, 126.148557267, -13.071682988), x_dir=(0.02749587661058229, 0.9996219169112968, 0), z_dir=(0, 0, 1)), Plane(origin=(91.936542927, 126.148557267, 43), x_dir=(0.02749587661058229, 0.9996219169112968, 0), z_dir=(0, 0, 1))) as chamfer_3_piece_17:
        with BuildLine():
            Line((1.028673195, 0), (-0.056547155, 1.027117794))
            Line((-0.056547155, 1.027117794), (-0.076539593, 1.026567876))
            ThreePointArc((-0.076539593, 1.026567876), (-0.034129227, 0.51339783), (-0.019992438, -0.000549918))
            Line((-0.019992438, -0.000549918), (0.000549918, -0.019992438))
            ThreePointArc((0.000549918, -0.019992438), (0.514497665, -0.00585565), (1.029223113, -0.019992438))
            Line((1.029223113, -0.019992438), (1.028673195, 0))
        make_face()
    extrude(amount=8.071682988, mode=Mode.SUBTRACT)
    with BuildSketch(Plane(origin=(94.508225915, 126.148557267, 48.5), x_dir=(0, 0.9996219169112968, 0.027495876610589196), z_dir=(-1, 0, 0))) as chamfer_3_piece_18:
        with BuildLine():
            Line((1.028673195, 0), (-0.056547155, 1.027117794))
            Line((-0.056547155, 1.027117794), (-0.076539593, 1.026567876))
            ThreePointArc((-0.076539593, 1.026567876), (-0.034129227, 0.51339783), (-0.019992438, -0.000549918))
            Line((-0.019992438, -0.000549918), (0.000549918, -0.019992438))
            ThreePointArc((0.000549918, -0.019992438), (0.514497665, -0.00585565), (1.029223113, -0.019992438))
            Line((1.029223113, -0.019992438), (1.028673195, 0))
        make_face()
    extrude(amount=30.575546079, mode=Mode.SUBTRACT)
    with BuildSketch(Plane(origin=(91.936542927, 123.576874279, 48.5), x_dir=(0.027495876610582105, 0, -0.999621916911297), z_dir=(0, 1, 0))) as chamfer_3_piece_19:
        with BuildLine():
            Line((1.028673195, 0), (-0.056547155, 1.027117794))
            Line((-0.056547155, 1.027117794), (-0.076539593, 1.026567876))
            ThreePointArc((-0.076539593, 1.026567876), (-0.034129227, 0.51339783), (-0.019992438, -0.000549918))
            Line((-0.019992438, -0.000549918), (0.000549918, -0.019992438))
            ThreePointArc((0.000549918, -0.019992438), (0.514497665, -0.00585565), (1.029223113, -0.019992438))
            Line((1.029223113, -0.019992438), (1.028673195, 0))
        make_face()
    extrude(amount=16.994808709, mode=Mode.SUBTRACT)
    with BuildSketch(Plane(origin=(91.936542927, 139, 40.428317012), x_dir=(-0.999621916911297, 0.027495876610582292, 0), z_dir=(0, 0, 1))) as chamfer_3_piece_20_section:
        with BuildLine():
            Line((1.028673195, 0), (-0.056547155, 1.027117794))
            Line((-0.056547155, 1.027117794), (-0.076539593, 1.026567876))
            ThreePointArc((-0.076539593, 1.026567876), (-0.034129227, 0.51339783), (-0.019992438, -0.000549918))
            Line((-0.019992438, -0.000549918), (0.000549918, -0.019992438))
            ThreePointArc((0.000549918, -0.019992438), (0.514497665, -0.00585565), (1.029223113, -0.019992438))
            Line((1.029223113, -0.019992438), (1.028673195, 0))
        make_face()
    chamfer_3_piece_20 = extrude(amount=9.643365976, mode=Mode.PRIVATE)
    chamfer_3_piece_20 = chamfer_3_piece_20 - Plane(origin=(91.606828487, 139, 19), x_dir=(0, 0, 1), z_dir=(1, 0, 0)) * Cylinder(24, 24, mode=Mode.PRIVATE)
    add(chamfer_3_piece_20, mode=Mode.SUBTRACT)
    with BuildSketch(Plane(origin=(91.936542927, 106.928161863, 43), x_dir=(0.027495876610582105, 0, -0.999621916911297), z_dir=(0, 1, 0))) as chamfer_3_piece_21a_section:
        with BuildLine():
            Line((1.028673195, 0), (-0.056547155, 1.027117794))
            Line((-0.056547155, 1.027117794), (-0.076539593, 1.026567876))
            ThreePointArc((-0.076539593, 1.026567876), (-0.034129227, 0.51339783), (-0.019992438, -0.000549918))
            Line((-0.019992438, -0.000549918), (0.000549918, -0.019992438))
            ThreePointArc((0.000549918, -0.019992438), (0.514497665, -0.00585565), (1.029223113, -0.019992438))
            Line((1.029223113, -0.019992438), (1.028673195, 0))
        make_face()
    chamfer_3_piece_21a = extrude(amount=19.220395404, mode=Mode.PRIVATE)
    chamfer_3_piece_21a = split(chamfer_3_piece_21a, bisect_by=Plane(origin=(92.310865996, 109.003101361, 42.685176958), z_dir=(-0.7986355100472916, -0.60181502315205, 0)), keep=Keep.TOP, mode=Mode.PRIVATE)
    with BuildSketch(Plane(origin=(120.547584086, 71.53171084, 43), x_dir=(-0.7983335594669047, -0.6015874870692686, 0.027495876610589096), z_dir=(-0.60181502315205, 0.7986355100472916, 0))) as chamfer_3_piece_21b_section:
        with BuildLine():
            Line((1.028673195, 0), (-0.056547155, -1.027117794))
            Line((-0.056547155, -1.027117794), (-0.076539593, -1.026567876))
            ThreePointArc((-0.076539593, -1.026567876), (-0.034129227, -0.51339783), (-0.019992438, 0.000549918))
            Line((-0.019992438, 0.000549918), (0.000549918, 0.019992438))
            ThreePointArc((0.000549918, 0.019992438), (0.514497665, 0.00585565), (1.029223113, 0.019992438))
            Line((1.029223113, 0.019992438), (1.028673195, 0))
        make_face()
    chamfer_3_piece_21b = extrude(amount=50.112937457, mode=Mode.PRIVATE)
    chamfer_3_piece_21b = split(chamfer_3_piece_21b, bisect_by=Plane(origin=(91.936542927, 110.121835087, 42.685176958), z_dir=(-1, 0, 0)), keep=Keep.TOP, mode=Mode.PRIVATE)
    chamfer_3_piece_21 = chamfer_3_piece_21a & chamfer_3_piece_21b
    add(chamfer_3_piece_21, mode=Mode.SUBTRACT)
    with BuildSketch(Plane(origin=(91.936542927, 126.148557267, 40.428317012), x_dir=(0.02749587661058229, 0.9996219169112968, 0), z_dir=(0, 0, 1))) as chamfer_3_piece_22a_section:
        with BuildLine():
            Line((1.028673195, 0), (-0.056547155, 1.027117794))
            Line((-0.056547155, 1.027117794), (-0.076539593, 1.026567876))
            ThreePointArc((-0.076539593, 1.026567876), (-0.034129227, 0.51339783), (-0.019992438, -0.000549918))
            Line((-0.019992438, -0.000549918), (0.000549918, -0.019992438))
            ThreePointArc((0.000549918, -0.019992438), (0.514497665, -0.00585565), (1.029223113, -0.019992438))
            Line((1.029223113, -0.019992438), (1.028673195, 0))
        make_face()
    chamfer_3_piece_22a = extrude(amount=10.643365976, mode=Mode.PRIVATE)
    chamfer_3_piece_22a = split(chamfer_3_piece_22a, bisect_by=Plane(origin=(91.6067493, 126.478350894, 43), z_dir=(0, 0, -1)), keep=Keep.TOP, mode=Mode.PRIVATE)
    with BuildSketch(Plane(origin=(91.936542927, 106.928161863, 43), x_dir=(0.027495876610582105, 0, -0.999621916911297), z_dir=(0, 1, 0))) as chamfer_3_piece_22b_section:
        with BuildLine():
            Line((1.028673195, 0), (-0.056547155, 1.027117794))
            Line((-0.056547155, 1.027117794), (-0.076539593, 1.026567876))
            ThreePointArc((-0.076539593, 1.026567876), (-0.034129227, 0.51339783), (-0.019992438, -0.000549918))
            Line((-0.019992438, -0.000549918), (0.000549918, -0.019992438))
            ThreePointArc((0.000549918, -0.019992438), (0.514497665, -0.00585565), (1.029223113, -0.019992438))
            Line((1.029223113, -0.019992438), (1.028673195, 0))
        make_face()
    chamfer_3_piece_22b = extrude(amount=21.792078392, mode=Mode.PRIVATE)
    chamfer_3_piece_22b = split(chamfer_3_piece_22b, bisect_by=Plane(origin=(91.6067493, 126.148557267, 42.670206373), z_dir=(0, 1, 0)), keep=Keep.TOP, mode=Mode.PRIVATE)
    chamfer_3_piece_22 = chamfer_3_piece_22a & chamfer_3_piece_22b
    add(chamfer_3_piece_22, mode=Mode.SUBTRACT)
    with BuildSketch(Plane(origin=(91.936542927, 126.148557267, -5), x_dir=(0.02749587661058217, 0, 0.9996219169112968), z_dir=(0, -1, 0))) as chamfer_3_piece_23a_section:
        with BuildLine():
            Line((1.028673195, 0), (-0.056547155, 1.027117794))
            Line((-0.056547155, 1.027117794), (-0.076539593, 1.026567876))
            ThreePointArc((-0.076539593, 1.026567876), (-0.034129227, 0.51339783), (-0.019992438, -0.000549918))
            Line((-0.019992438, -0.000549918), (0.000549918, -0.019992438))
            ThreePointArc((0.000549918, -0.019992438), (0.514497665, -0.00585565), (1.029223113, -0.019992438))
            Line((1.029223113, -0.019992438), (1.028673195, 0))
        make_face()
    chamfer_3_piece_23a = extrude(amount=19.220395404, mode=Mode.PRIVATE)
    chamfer_3_piece_23a = split(chamfer_3_piece_23a, bisect_by=Plane(origin=(92.310865996, 109.003101361, -4.685176958), z_dir=(-0.7986355100472919, -0.6018150231520495, 0)), keep=Keep.TOP, mode=Mode.PRIVATE)
    with BuildSketch(Plane(origin=(90.38886547, 111.553682205, -5), x_dir=(-0.7983335594669051, -0.6015874870692681, -0.027495876610586504), z_dir=(0.6018150231520495, -0.7986355100472919, 0))) as chamfer_3_piece_23b_section:
        with BuildLine():
            Line((1.028673195, 0), (-0.056547155, -1.027117794))
            Line((-0.056547155, -1.027117794), (-0.076539593, -1.026567876))
            ThreePointArc((-0.076539593, -1.026567876), (-0.034129227, -0.51339783), (-0.019992438, 0.000549918))
            Line((-0.019992438, 0.000549918), (0.000549918, 0.019992438))
            ThreePointArc((0.000549918, 0.019992438), (0.514497665, 0.00585565), (1.029223113, 0.019992438))
            Line((1.029223113, 0.019992438), (1.028673195, 0))
        make_face()
    chamfer_3_piece_23b = extrude(amount=50.112937457, mode=Mode.PRIVATE)
    chamfer_3_piece_23b = split(chamfer_3_piece_23b, bisect_by=Plane(origin=(91.936542927, 110.121835087, -4.685176958), z_dir=(-1, 0, 0)), keep=Keep.TOP, mode=Mode.PRIVATE)
    chamfer_3_piece_23 = chamfer_3_piece_23a & chamfer_3_piece_23b
    add(chamfer_3_piece_23, mode=Mode.SUBTRACT)
    with BuildSketch(Plane(origin=(91.936542927, 139, 40.428317012), x_dir=(-0.999621916911297, 0.027495876610582292, 0), z_dir=(0, 0, 1))) as chamfer_3_piece_24a_section:
        with BuildLine():
            Line((1.028673195, 0), (-0.056547155, 1.027117794))
            Line((-0.056547155, 1.027117794), (-0.076539593, 1.026567876))
            ThreePointArc((-0.076539593, 1.026567876), (-0.034129227, 0.51339783), (-0.019992438, -0.000549918))
            Line((-0.019992438, -0.000549918), (0.000549918, -0.019992438))
            ThreePointArc((0.000549918, -0.019992438), (0.514497665, -0.00585565), (1.029223113, -0.019992438))
            Line((1.029223113, -0.019992438), (1.028673195, 0))
        make_face()
    chamfer_3_piece_24a = extrude(amount=9.643365976, mode=Mode.PRIVATE)
    chamfer_3_piece_24a = chamfer_3_piece_24a & Plane(origin=(91.606531136, 139, 19), x_dir=(0, 0, 1), z_dir=(1, 0, 0)) * Cylinder(24, 24, mode=Mode.PRIVATE)
    with BuildSketch(Plane(origin=(91.936542927, 139, 19), x_dir=(0, -0.10708445732496112, 0.9942499278347565), z_dir=(0, -0.9942499278347565, -0.10708445732496112))) as chamfer_3_piece_24b_section:
        with BuildLine():
            Line((22.971715729, -0.028284271), (24.028284271, 1.028284271))
            Line((24.028284271, 1.028284271), (24.048284271, 1.028284271))
            ThreePointArc((24.048284271, 1.028284271), (24.02, 0.514142136), (24.02, 0))
            Line((24.02, 0), (24, -0.02))
            ThreePointArc((24, -0.02), (23.485857864, -0.02), (22.971715729, -0.048284271))
            Line((22.971715729, -0.048284271), (22.971715729, -0.028284271))
        make_face()
    chamfer_3_piece_24b = revolve(axis=Axis((91.936542927, 139, 19), (-1, 0, 0)), revolution_arc=172.644248448, mode=Mode.PRIVATE)
    chamfer_3_piece_24b = split(chamfer_3_piece_24b, bisect_by=Plane(origin=(91.605315127, 139, 42.627498031), z_dir=(0, -1, 0)), keep=Keep.TOP, mode=Mode.PRIVATE)
    chamfer_3_piece_24 = chamfer_3_piece_24a & chamfer_3_piece_24b
    add(chamfer_3_piece_24, mode=Mode.SUBTRACT)
    with BuildSketch(Plane(origin=(91.936542927, 126.148557267, -13.071682988), x_dir=(0.02749587661058229, 0.9996219169112968, 0), z_dir=(0, 0, 1))) as chamfer_3_piece_25a_section:
        with BuildLine():
            Line((1.028673195, 0), (-0.056547155, 1.027117794))
            Line((-0.056547155, 1.027117794), (-0.076539593, 1.026567876))
            ThreePointArc((-0.076539593, 1.026567876), (-0.034129227, 0.51339783), (-0.019992438, -0.000549918))
            Line((-0.019992438, -0.000549918), (0.000549918, -0.019992438))
            ThreePointArc((0.000549918, -0.019992438), (0.514497665, -0.00585565), (1.029223113, -0.019992438))
            Line((1.029223113, -0.019992438), (1.028673195, 0))
        make_face()
    chamfer_3_piece_25a = extrude(amount=10.643365976, mode=Mode.PRIVATE)
    chamfer_3_piece_25a = split(chamfer_3_piece_25a, bisect_by=Plane(origin=(91.6067493, 126.478350893, -5), z_dir=(0, 0, 1)), keep=Keep.TOP, mode=Mode.PRIVATE)
    with BuildSketch(Plane(origin=(91.936542927, 128.720240255, -5), x_dir=(0.02749587661058217, 0, 0.9996219169112968), z_dir=(0, -1, 0))) as chamfer_3_piece_25b_section:
        with BuildLine():
            Line((1.028673195, 0), (-0.056547155, 1.027117794))
            Line((-0.056547155, 1.027117794), (-0.076539593, 1.026567876))
            ThreePointArc((-0.076539593, 1.026567876), (-0.034129227, 0.51339783), (-0.019992438, -0.000549918))
            Line((-0.019992438, -0.000549918), (0.000549918, -0.019992438))
            ThreePointArc((0.000549918, -0.019992438), (0.514497665, -0.00585565), (1.029223113, -0.019992438))
            Line((1.029223113, -0.019992438), (1.028673195, 0))
        make_face()
    chamfer_3_piece_25b = extrude(amount=21.792078392, mode=Mode.PRIVATE)
    chamfer_3_piece_25b = split(chamfer_3_piece_25b, bisect_by=Plane(origin=(91.6067493, 126.148557267, -4.670206373), z_dir=(0, 1, 0)), keep=Keep.TOP, mode=Mode.PRIVATE)
    chamfer_3_piece_25 = chamfer_3_piece_25a & chamfer_3_piece_25b
    add(chamfer_3_piece_25, mode=Mode.SUBTRACT)


solid = part.part
